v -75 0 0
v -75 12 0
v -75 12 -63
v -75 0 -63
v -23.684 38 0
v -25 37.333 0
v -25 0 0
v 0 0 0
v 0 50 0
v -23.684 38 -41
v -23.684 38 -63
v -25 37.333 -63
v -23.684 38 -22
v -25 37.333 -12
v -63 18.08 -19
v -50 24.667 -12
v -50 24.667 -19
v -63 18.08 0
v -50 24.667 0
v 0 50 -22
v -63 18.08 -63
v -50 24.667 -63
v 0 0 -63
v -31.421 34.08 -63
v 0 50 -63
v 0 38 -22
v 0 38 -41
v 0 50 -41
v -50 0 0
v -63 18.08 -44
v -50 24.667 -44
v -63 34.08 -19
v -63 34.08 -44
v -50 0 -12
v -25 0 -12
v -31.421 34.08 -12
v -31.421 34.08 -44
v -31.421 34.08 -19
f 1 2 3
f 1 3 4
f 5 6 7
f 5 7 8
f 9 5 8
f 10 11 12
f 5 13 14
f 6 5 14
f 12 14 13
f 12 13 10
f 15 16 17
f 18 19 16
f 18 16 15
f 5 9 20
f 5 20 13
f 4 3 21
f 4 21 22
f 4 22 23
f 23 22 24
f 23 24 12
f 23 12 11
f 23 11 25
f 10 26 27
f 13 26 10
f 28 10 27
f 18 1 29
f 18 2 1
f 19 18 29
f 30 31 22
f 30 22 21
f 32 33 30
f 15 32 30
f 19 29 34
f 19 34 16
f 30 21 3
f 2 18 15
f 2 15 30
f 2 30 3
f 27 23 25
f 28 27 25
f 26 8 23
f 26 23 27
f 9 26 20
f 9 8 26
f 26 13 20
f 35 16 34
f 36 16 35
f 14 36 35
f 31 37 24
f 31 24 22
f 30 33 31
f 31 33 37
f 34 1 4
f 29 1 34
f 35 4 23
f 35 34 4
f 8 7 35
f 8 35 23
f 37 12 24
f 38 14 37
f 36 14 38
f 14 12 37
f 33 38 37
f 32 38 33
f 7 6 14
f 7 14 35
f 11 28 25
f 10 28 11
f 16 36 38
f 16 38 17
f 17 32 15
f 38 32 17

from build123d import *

# Parameters (mm, degrees)
BOSS_EXTRUDE1_DEPTH   = 63
BOSS_EXTRUDE1_2_DEPTH = 63
BOSS_EXTRUDE2_START   = -12
BOSS_EXTRUDE2_DEPTH   = 51
BOSS_EXTRUDE3_START   = -19
BOSS_EXTRUDE3_DEPTH   = 25
BOSS_EXTRUDE4_START   = -41
BOSS_EXTRUDE4_DEPTH   = 22
BOSS_EXTRUDE5_DEPTH   = 22


with BuildPart() as part:
    # Sketch1 → Boss-Extrude1 (new body)
    with BuildSketch(Plane.XY):
        Polygon((-25, 0), (0, 0), (0, 38), (-23.684210526, 38), (-25, 37.333333333), align=None)
    extrude(amount=-BOSS_EXTRUDE1_DEPTH)



with BuildPart() as body_2:
    # Sketch1 → Boss-Extrude1 2 (new body)
    with BuildSketch(Plane.XY):
        Polygon((-75, 0), (-50, 0), (-50, 24.666666667), (-75, 12), align=None)
    extrude(amount=-BOSS_EXTRUDE1_2_DEPTH)


with BuildPart() as part_1:
    add(part.part)

    add(body_2.part)  # Boss-Extrude2 merges body 2
    # Sketch1<3> → Boss-Extrude2 (add)
    with BuildSketch(Plane.XY.offset(BOSS_EXTRUDE2_START)):
        Polygon((-50, 0), (-25, 0), (-25, 37.333333333), (-31.421052632, 34.08), (-50, 24.666666667), align=None)
    extrude(amount=-BOSS_EXTRUDE2_DEPTH)

    # Sketch1<4> → Boss-Extrude3 (add)
    with BuildSketch(Plane.XY.offset(BOSS_EXTRUDE3_START)):
        Polygon((-63, 18.08), (-50, 24.666666667), (-31.421052632, 34.08), (-63, 34.08), align=None)
    extrude(amount=-BOSS_EXTRUDE3_DEPTH)

    # Sketch1<5> → Boss-Extrude4 (add)
    with BuildSketch(Plane.XY.offset(BOSS_EXTRUDE4_START)):
        Polygon((-23.684210526, 38), (0, 38), (0, 50), align=None)
    extrude(amount=-BOSS_EXTRUDE4_DEPTH)

    # Sketch1<6> → Boss-Extrude5 (add)
    with BuildSketch(Plane.XY):
        Polygon((-23.684210526, 38), (0, 38), (0, 50), align=None)
    extrude(amount=-BOSS_EXTRUDE5_DEPTH)


solid = part_1.part
